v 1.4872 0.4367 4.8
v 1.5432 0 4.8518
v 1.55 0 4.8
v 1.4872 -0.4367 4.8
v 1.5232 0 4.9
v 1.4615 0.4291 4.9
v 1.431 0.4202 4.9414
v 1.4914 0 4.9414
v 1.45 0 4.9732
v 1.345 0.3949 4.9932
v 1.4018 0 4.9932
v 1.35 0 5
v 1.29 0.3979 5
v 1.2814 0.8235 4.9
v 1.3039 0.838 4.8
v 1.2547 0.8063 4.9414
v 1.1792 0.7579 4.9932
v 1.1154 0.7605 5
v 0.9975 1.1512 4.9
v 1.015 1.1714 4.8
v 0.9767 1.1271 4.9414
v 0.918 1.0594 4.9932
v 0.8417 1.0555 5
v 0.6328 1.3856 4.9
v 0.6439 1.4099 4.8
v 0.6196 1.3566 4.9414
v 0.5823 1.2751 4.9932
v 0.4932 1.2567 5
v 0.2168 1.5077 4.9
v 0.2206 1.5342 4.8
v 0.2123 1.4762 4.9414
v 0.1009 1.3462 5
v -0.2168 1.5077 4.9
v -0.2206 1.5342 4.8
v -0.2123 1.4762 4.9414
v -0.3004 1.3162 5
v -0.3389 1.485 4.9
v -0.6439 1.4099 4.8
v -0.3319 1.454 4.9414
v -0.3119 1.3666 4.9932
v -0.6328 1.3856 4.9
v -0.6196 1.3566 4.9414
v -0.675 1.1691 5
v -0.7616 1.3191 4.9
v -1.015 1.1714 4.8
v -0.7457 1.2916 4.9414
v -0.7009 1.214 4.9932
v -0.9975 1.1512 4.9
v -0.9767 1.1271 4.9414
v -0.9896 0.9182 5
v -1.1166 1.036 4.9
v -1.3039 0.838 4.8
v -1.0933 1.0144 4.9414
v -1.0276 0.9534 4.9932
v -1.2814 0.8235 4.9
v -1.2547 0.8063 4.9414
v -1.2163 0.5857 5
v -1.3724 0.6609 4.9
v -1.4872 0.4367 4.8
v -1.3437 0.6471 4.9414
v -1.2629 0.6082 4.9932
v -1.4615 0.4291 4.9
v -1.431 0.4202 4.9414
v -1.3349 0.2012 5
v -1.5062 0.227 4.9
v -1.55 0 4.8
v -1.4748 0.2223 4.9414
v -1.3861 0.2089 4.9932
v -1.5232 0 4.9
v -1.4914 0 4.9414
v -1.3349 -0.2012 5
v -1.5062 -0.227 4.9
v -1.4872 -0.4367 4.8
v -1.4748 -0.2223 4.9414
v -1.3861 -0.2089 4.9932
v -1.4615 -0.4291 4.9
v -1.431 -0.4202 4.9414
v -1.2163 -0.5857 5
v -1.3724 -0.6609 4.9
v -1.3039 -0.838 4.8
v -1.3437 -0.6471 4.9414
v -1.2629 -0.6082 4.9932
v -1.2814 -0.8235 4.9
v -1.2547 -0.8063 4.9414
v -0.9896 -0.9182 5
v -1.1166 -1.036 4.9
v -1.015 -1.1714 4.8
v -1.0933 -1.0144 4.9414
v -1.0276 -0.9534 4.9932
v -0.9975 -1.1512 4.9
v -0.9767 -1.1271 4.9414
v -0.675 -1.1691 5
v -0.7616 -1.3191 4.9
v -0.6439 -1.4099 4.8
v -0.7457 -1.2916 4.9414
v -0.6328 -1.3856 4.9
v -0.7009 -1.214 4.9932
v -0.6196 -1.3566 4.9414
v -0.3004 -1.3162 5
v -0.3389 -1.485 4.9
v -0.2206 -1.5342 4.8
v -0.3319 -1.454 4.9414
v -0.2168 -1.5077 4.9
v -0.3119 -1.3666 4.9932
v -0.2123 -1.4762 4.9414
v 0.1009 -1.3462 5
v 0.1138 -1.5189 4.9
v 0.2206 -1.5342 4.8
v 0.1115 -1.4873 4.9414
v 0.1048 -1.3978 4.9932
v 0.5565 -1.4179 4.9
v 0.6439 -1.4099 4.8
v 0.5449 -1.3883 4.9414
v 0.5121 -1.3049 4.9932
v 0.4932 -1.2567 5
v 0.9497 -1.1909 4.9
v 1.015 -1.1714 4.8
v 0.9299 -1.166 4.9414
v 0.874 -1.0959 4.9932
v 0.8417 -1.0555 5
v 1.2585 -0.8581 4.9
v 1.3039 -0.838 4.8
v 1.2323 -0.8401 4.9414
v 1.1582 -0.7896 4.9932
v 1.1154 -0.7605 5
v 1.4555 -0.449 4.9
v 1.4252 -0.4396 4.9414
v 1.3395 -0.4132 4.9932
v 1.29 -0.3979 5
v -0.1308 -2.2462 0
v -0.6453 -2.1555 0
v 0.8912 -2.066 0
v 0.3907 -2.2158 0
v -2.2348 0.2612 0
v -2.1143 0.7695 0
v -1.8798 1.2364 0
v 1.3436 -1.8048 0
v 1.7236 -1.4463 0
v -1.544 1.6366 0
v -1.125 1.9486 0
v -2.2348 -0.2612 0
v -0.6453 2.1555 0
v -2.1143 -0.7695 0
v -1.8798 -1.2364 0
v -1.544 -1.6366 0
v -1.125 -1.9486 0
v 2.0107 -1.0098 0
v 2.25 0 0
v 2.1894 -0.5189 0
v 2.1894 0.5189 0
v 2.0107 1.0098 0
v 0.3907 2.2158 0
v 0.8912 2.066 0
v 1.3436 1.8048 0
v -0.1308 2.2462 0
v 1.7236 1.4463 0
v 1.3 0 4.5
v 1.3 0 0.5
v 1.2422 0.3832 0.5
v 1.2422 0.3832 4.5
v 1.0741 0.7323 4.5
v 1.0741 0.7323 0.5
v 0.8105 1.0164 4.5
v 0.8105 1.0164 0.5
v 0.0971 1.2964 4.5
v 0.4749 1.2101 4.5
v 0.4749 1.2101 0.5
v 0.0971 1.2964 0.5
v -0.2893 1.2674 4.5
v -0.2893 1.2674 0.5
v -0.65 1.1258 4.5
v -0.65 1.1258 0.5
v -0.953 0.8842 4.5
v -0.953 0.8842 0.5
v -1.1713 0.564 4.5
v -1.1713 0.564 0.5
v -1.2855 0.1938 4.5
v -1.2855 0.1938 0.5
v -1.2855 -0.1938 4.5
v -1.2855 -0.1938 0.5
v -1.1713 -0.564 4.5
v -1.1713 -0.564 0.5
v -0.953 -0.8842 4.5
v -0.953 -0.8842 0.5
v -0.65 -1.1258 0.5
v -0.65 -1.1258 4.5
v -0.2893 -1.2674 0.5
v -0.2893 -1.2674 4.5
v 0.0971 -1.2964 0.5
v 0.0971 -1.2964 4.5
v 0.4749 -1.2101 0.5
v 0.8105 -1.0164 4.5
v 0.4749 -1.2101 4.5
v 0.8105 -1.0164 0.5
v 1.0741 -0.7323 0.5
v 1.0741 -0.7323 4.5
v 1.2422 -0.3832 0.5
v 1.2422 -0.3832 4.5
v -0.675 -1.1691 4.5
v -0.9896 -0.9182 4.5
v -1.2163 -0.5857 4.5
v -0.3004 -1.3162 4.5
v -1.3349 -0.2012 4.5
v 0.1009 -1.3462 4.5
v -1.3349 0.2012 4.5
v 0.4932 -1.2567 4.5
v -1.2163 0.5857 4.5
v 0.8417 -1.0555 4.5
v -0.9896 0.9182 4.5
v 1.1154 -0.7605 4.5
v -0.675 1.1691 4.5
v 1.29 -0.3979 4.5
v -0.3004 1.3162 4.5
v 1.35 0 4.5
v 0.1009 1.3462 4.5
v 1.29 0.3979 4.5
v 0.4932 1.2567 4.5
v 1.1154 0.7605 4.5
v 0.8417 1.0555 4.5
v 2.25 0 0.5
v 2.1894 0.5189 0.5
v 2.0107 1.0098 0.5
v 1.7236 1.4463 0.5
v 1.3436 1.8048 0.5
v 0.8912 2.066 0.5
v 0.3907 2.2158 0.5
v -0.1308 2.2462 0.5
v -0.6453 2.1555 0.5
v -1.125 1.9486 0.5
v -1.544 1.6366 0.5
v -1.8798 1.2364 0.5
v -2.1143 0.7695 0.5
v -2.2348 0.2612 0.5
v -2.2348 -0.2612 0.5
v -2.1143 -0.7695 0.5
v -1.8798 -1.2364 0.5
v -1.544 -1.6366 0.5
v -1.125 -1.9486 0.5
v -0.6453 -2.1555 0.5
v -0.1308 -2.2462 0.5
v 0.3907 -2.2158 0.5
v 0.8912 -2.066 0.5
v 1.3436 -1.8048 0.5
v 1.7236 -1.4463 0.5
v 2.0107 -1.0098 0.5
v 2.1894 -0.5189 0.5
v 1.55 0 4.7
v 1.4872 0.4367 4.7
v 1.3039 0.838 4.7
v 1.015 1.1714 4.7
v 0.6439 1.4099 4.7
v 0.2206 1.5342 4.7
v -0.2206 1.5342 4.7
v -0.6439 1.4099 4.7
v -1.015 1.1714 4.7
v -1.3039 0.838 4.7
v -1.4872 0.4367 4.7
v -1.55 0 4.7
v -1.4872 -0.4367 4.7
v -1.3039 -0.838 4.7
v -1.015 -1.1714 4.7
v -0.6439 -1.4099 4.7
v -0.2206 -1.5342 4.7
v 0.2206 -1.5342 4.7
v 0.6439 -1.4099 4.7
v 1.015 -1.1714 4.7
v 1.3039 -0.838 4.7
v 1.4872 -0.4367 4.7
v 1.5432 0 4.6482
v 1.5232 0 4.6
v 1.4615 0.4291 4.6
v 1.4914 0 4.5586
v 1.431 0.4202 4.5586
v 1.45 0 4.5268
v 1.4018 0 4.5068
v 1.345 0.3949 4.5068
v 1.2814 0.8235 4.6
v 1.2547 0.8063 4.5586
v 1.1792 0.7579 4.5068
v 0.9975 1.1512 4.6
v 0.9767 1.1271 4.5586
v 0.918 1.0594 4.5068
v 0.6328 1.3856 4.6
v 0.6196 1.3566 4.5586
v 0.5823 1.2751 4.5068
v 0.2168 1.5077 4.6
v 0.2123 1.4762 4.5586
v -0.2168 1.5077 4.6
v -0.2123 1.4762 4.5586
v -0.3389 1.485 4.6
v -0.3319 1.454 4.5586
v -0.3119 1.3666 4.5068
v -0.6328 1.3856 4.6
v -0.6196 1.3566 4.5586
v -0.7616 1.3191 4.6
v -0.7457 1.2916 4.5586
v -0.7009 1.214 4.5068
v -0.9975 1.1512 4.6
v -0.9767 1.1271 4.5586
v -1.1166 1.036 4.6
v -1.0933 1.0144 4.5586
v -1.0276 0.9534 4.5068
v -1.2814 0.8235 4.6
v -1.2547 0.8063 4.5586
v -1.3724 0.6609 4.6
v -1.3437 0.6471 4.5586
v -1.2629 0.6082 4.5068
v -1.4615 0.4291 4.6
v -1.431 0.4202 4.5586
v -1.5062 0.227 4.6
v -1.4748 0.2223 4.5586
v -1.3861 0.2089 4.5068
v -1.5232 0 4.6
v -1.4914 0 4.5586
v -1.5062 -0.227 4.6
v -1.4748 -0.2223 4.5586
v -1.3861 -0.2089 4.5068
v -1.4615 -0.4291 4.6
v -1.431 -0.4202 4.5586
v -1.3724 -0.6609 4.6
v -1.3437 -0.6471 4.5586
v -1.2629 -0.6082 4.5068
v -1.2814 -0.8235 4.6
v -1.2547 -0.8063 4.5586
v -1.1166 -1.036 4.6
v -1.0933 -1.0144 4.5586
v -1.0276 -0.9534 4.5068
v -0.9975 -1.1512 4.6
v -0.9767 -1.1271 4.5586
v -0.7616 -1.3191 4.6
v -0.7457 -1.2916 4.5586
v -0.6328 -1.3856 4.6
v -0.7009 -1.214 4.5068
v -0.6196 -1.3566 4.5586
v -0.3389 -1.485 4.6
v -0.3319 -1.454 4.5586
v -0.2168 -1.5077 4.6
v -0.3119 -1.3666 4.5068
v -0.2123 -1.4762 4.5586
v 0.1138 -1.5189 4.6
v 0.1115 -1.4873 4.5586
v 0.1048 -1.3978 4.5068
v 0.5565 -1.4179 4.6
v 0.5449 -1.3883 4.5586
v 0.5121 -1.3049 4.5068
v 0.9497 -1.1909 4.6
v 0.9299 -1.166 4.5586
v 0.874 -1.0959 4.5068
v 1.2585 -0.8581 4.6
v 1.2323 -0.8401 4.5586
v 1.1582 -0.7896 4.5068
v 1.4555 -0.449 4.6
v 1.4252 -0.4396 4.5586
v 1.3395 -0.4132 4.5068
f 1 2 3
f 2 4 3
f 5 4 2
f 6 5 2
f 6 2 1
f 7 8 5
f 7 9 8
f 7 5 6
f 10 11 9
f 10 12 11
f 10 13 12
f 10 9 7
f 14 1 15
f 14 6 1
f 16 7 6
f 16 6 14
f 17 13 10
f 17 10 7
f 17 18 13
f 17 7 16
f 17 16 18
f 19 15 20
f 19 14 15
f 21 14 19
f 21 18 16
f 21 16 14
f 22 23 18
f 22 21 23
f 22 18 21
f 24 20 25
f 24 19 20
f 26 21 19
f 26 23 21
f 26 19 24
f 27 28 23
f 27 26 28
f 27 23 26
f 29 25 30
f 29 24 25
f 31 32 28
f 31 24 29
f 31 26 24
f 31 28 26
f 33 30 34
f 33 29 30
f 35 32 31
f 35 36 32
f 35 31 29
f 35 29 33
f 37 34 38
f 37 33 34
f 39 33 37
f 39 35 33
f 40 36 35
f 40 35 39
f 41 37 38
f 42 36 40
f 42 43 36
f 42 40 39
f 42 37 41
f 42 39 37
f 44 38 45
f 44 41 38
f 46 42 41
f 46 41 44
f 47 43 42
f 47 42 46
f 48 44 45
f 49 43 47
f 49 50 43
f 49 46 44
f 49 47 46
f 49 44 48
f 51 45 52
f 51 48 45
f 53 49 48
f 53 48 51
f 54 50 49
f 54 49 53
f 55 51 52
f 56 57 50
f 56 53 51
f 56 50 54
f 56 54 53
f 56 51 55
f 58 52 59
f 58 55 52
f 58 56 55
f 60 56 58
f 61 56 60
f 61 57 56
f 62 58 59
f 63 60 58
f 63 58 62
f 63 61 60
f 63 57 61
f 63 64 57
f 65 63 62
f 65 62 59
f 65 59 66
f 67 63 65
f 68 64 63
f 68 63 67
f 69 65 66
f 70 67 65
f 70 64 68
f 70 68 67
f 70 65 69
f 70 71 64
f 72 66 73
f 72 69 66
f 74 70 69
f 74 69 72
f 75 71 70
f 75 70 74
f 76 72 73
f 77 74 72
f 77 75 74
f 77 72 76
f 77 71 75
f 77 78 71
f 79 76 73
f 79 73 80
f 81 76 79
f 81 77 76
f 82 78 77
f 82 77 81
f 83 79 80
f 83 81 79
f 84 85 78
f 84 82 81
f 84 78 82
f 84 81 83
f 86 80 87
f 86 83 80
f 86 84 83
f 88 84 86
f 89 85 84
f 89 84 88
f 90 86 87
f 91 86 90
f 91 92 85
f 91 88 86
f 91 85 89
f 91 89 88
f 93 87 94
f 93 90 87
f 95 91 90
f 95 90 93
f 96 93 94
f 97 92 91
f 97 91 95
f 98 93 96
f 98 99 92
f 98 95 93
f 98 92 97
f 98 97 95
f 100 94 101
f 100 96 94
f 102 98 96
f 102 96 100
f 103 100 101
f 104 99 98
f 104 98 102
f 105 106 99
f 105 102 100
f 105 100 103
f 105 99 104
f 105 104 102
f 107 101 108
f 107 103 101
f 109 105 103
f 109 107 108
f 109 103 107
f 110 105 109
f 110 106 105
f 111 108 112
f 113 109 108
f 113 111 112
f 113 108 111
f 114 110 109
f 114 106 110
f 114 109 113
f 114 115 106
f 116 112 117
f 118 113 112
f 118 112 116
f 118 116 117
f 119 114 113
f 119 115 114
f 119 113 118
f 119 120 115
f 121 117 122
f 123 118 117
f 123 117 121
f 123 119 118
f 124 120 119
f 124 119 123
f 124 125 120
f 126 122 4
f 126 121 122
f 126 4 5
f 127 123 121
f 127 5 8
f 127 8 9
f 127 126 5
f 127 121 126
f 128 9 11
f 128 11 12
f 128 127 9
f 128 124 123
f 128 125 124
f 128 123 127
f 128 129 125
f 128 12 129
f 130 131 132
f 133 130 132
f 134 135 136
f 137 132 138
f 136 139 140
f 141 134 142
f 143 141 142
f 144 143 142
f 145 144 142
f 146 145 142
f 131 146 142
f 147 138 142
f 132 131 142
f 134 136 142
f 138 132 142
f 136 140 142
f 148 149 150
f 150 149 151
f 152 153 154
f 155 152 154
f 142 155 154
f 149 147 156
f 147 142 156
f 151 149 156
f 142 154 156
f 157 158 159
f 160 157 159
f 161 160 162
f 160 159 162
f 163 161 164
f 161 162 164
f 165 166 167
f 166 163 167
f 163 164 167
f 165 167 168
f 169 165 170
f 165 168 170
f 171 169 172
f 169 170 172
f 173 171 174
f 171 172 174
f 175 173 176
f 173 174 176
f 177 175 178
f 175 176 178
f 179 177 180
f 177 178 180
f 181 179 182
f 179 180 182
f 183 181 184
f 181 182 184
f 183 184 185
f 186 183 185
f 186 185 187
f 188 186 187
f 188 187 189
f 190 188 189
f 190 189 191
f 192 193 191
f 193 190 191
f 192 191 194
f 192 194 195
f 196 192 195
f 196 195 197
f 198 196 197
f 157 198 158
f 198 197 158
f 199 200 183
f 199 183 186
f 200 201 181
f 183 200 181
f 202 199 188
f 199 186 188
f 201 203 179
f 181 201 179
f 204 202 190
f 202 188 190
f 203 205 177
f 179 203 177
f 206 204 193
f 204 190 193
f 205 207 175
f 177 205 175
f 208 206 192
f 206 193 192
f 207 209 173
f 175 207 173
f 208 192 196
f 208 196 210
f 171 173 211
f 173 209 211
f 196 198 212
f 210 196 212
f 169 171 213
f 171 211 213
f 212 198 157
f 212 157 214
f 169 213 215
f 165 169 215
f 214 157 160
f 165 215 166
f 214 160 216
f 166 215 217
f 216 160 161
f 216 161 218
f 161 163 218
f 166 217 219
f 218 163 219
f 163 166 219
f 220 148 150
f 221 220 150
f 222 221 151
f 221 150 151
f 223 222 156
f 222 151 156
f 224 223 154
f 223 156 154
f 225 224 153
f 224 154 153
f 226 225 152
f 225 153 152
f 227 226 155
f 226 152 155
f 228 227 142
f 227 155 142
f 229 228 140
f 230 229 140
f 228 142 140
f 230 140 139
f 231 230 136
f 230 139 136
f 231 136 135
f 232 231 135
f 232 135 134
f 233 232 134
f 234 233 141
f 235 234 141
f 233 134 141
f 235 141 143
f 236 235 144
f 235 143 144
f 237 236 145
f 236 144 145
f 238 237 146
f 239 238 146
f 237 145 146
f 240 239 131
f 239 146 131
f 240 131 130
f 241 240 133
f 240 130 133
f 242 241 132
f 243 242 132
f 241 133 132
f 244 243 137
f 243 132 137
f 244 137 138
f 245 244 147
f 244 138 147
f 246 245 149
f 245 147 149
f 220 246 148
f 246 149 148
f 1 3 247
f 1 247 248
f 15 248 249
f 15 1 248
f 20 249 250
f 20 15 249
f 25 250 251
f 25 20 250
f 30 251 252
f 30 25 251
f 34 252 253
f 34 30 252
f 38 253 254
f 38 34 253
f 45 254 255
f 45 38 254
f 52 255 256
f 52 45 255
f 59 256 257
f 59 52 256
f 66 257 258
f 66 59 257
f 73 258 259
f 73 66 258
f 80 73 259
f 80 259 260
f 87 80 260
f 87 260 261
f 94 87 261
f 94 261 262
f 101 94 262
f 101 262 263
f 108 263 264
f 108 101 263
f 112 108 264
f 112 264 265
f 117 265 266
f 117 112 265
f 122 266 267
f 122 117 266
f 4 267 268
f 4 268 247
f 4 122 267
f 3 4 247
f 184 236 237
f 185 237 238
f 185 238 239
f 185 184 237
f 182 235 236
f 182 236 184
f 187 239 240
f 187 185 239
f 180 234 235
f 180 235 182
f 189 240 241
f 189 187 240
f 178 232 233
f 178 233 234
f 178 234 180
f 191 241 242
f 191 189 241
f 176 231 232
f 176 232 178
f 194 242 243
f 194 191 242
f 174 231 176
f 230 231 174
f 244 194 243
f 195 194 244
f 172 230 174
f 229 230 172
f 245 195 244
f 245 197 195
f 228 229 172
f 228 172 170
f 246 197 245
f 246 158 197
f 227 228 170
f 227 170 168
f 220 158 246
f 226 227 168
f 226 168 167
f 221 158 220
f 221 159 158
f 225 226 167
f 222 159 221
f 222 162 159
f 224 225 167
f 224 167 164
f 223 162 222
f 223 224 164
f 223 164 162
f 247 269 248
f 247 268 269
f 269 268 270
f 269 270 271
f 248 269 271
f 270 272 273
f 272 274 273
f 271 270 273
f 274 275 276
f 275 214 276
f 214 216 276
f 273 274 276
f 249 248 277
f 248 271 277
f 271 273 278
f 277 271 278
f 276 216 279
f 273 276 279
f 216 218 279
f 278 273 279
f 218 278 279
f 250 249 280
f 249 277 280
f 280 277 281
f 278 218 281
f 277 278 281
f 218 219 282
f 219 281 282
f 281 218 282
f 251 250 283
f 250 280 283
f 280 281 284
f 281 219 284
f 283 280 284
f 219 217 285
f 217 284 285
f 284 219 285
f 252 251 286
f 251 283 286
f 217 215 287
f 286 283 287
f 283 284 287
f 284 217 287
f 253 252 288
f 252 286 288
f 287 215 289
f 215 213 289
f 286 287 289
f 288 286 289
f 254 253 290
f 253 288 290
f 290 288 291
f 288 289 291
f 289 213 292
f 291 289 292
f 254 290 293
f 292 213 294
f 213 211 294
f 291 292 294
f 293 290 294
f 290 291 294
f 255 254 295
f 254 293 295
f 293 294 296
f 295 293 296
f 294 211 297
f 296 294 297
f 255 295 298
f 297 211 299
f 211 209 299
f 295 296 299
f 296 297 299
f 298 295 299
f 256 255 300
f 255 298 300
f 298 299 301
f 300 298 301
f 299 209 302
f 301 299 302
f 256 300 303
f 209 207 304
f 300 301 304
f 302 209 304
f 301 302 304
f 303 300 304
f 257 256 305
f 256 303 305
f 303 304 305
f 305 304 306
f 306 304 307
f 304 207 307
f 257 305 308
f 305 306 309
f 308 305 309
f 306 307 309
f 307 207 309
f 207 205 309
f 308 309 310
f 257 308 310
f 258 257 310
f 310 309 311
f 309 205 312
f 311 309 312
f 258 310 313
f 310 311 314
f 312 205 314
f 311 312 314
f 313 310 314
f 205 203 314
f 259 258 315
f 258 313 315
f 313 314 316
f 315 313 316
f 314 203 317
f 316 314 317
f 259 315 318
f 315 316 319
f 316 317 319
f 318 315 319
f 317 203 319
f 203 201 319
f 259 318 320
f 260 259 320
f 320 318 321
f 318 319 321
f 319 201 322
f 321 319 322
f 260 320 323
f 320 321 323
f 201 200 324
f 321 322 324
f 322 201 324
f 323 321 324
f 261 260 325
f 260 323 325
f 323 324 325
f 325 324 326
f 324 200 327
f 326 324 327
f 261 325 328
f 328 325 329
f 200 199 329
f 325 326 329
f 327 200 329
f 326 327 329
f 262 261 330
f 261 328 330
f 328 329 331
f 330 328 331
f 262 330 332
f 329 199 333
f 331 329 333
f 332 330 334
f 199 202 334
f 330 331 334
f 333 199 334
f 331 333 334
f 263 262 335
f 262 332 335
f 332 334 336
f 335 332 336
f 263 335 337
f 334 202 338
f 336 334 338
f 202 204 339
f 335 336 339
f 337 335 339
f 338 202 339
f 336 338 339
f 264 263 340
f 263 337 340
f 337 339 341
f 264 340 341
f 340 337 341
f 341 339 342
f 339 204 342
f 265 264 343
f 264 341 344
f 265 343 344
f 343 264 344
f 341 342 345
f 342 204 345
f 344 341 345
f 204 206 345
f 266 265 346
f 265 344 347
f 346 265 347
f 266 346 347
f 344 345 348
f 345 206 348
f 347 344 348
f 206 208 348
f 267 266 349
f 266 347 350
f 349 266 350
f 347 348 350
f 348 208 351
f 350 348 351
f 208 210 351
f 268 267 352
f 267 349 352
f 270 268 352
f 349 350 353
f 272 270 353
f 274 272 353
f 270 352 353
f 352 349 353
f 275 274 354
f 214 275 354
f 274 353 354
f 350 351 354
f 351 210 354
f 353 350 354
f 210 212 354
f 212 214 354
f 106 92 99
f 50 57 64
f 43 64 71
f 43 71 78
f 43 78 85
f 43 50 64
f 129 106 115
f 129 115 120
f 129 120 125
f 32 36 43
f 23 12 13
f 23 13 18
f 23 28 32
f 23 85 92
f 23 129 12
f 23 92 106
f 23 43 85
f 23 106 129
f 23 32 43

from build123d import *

# Parameters (mm, degrees)
F0_R     = 2.25
F0_R_2   = 1.5
F0_R_3   = 1.3
F1_DEPTH = 0.5
F2_DEPTH = 5
F3_R     = 1.55
F4_DEPTH = 0.5
F5_R     = 0.2


with BuildPart() as f1:
    # F0 (on Top) → F1 (new body)
    with BuildSketch(Plane.XY):
        Circle(F0_R)
        Circle(F0_R_2, mode=Mode.SUBTRACT)
        Circle(F0_R_2)
        Circle(F0_R_3, mode=Mode.SUBTRACT)
        Circle(F0_R_3)
    extrude(amount=F1_DEPTH)

    # F0 (on Top) → F2 (join)
    with BuildSketch(Plane.XY):
        Circle(F0_R_3)
    extrude(amount=F2_DEPTH)

    # F3 (on face) → F4 (join)
    with BuildSketch(Plane.XY.offset(5)):
        Circle(F3_R)
    extrude(amount=-F4_DEPTH)

    # F5
    f5_edges = [f1.edges().sort_by_distance(p)[0] for p in [
        (-1.55, 0, 4.5),
        (-1.55, 0, 5),
    ]]
    fillet(f5_edges, radius=F5_R)


solid = f1.part
